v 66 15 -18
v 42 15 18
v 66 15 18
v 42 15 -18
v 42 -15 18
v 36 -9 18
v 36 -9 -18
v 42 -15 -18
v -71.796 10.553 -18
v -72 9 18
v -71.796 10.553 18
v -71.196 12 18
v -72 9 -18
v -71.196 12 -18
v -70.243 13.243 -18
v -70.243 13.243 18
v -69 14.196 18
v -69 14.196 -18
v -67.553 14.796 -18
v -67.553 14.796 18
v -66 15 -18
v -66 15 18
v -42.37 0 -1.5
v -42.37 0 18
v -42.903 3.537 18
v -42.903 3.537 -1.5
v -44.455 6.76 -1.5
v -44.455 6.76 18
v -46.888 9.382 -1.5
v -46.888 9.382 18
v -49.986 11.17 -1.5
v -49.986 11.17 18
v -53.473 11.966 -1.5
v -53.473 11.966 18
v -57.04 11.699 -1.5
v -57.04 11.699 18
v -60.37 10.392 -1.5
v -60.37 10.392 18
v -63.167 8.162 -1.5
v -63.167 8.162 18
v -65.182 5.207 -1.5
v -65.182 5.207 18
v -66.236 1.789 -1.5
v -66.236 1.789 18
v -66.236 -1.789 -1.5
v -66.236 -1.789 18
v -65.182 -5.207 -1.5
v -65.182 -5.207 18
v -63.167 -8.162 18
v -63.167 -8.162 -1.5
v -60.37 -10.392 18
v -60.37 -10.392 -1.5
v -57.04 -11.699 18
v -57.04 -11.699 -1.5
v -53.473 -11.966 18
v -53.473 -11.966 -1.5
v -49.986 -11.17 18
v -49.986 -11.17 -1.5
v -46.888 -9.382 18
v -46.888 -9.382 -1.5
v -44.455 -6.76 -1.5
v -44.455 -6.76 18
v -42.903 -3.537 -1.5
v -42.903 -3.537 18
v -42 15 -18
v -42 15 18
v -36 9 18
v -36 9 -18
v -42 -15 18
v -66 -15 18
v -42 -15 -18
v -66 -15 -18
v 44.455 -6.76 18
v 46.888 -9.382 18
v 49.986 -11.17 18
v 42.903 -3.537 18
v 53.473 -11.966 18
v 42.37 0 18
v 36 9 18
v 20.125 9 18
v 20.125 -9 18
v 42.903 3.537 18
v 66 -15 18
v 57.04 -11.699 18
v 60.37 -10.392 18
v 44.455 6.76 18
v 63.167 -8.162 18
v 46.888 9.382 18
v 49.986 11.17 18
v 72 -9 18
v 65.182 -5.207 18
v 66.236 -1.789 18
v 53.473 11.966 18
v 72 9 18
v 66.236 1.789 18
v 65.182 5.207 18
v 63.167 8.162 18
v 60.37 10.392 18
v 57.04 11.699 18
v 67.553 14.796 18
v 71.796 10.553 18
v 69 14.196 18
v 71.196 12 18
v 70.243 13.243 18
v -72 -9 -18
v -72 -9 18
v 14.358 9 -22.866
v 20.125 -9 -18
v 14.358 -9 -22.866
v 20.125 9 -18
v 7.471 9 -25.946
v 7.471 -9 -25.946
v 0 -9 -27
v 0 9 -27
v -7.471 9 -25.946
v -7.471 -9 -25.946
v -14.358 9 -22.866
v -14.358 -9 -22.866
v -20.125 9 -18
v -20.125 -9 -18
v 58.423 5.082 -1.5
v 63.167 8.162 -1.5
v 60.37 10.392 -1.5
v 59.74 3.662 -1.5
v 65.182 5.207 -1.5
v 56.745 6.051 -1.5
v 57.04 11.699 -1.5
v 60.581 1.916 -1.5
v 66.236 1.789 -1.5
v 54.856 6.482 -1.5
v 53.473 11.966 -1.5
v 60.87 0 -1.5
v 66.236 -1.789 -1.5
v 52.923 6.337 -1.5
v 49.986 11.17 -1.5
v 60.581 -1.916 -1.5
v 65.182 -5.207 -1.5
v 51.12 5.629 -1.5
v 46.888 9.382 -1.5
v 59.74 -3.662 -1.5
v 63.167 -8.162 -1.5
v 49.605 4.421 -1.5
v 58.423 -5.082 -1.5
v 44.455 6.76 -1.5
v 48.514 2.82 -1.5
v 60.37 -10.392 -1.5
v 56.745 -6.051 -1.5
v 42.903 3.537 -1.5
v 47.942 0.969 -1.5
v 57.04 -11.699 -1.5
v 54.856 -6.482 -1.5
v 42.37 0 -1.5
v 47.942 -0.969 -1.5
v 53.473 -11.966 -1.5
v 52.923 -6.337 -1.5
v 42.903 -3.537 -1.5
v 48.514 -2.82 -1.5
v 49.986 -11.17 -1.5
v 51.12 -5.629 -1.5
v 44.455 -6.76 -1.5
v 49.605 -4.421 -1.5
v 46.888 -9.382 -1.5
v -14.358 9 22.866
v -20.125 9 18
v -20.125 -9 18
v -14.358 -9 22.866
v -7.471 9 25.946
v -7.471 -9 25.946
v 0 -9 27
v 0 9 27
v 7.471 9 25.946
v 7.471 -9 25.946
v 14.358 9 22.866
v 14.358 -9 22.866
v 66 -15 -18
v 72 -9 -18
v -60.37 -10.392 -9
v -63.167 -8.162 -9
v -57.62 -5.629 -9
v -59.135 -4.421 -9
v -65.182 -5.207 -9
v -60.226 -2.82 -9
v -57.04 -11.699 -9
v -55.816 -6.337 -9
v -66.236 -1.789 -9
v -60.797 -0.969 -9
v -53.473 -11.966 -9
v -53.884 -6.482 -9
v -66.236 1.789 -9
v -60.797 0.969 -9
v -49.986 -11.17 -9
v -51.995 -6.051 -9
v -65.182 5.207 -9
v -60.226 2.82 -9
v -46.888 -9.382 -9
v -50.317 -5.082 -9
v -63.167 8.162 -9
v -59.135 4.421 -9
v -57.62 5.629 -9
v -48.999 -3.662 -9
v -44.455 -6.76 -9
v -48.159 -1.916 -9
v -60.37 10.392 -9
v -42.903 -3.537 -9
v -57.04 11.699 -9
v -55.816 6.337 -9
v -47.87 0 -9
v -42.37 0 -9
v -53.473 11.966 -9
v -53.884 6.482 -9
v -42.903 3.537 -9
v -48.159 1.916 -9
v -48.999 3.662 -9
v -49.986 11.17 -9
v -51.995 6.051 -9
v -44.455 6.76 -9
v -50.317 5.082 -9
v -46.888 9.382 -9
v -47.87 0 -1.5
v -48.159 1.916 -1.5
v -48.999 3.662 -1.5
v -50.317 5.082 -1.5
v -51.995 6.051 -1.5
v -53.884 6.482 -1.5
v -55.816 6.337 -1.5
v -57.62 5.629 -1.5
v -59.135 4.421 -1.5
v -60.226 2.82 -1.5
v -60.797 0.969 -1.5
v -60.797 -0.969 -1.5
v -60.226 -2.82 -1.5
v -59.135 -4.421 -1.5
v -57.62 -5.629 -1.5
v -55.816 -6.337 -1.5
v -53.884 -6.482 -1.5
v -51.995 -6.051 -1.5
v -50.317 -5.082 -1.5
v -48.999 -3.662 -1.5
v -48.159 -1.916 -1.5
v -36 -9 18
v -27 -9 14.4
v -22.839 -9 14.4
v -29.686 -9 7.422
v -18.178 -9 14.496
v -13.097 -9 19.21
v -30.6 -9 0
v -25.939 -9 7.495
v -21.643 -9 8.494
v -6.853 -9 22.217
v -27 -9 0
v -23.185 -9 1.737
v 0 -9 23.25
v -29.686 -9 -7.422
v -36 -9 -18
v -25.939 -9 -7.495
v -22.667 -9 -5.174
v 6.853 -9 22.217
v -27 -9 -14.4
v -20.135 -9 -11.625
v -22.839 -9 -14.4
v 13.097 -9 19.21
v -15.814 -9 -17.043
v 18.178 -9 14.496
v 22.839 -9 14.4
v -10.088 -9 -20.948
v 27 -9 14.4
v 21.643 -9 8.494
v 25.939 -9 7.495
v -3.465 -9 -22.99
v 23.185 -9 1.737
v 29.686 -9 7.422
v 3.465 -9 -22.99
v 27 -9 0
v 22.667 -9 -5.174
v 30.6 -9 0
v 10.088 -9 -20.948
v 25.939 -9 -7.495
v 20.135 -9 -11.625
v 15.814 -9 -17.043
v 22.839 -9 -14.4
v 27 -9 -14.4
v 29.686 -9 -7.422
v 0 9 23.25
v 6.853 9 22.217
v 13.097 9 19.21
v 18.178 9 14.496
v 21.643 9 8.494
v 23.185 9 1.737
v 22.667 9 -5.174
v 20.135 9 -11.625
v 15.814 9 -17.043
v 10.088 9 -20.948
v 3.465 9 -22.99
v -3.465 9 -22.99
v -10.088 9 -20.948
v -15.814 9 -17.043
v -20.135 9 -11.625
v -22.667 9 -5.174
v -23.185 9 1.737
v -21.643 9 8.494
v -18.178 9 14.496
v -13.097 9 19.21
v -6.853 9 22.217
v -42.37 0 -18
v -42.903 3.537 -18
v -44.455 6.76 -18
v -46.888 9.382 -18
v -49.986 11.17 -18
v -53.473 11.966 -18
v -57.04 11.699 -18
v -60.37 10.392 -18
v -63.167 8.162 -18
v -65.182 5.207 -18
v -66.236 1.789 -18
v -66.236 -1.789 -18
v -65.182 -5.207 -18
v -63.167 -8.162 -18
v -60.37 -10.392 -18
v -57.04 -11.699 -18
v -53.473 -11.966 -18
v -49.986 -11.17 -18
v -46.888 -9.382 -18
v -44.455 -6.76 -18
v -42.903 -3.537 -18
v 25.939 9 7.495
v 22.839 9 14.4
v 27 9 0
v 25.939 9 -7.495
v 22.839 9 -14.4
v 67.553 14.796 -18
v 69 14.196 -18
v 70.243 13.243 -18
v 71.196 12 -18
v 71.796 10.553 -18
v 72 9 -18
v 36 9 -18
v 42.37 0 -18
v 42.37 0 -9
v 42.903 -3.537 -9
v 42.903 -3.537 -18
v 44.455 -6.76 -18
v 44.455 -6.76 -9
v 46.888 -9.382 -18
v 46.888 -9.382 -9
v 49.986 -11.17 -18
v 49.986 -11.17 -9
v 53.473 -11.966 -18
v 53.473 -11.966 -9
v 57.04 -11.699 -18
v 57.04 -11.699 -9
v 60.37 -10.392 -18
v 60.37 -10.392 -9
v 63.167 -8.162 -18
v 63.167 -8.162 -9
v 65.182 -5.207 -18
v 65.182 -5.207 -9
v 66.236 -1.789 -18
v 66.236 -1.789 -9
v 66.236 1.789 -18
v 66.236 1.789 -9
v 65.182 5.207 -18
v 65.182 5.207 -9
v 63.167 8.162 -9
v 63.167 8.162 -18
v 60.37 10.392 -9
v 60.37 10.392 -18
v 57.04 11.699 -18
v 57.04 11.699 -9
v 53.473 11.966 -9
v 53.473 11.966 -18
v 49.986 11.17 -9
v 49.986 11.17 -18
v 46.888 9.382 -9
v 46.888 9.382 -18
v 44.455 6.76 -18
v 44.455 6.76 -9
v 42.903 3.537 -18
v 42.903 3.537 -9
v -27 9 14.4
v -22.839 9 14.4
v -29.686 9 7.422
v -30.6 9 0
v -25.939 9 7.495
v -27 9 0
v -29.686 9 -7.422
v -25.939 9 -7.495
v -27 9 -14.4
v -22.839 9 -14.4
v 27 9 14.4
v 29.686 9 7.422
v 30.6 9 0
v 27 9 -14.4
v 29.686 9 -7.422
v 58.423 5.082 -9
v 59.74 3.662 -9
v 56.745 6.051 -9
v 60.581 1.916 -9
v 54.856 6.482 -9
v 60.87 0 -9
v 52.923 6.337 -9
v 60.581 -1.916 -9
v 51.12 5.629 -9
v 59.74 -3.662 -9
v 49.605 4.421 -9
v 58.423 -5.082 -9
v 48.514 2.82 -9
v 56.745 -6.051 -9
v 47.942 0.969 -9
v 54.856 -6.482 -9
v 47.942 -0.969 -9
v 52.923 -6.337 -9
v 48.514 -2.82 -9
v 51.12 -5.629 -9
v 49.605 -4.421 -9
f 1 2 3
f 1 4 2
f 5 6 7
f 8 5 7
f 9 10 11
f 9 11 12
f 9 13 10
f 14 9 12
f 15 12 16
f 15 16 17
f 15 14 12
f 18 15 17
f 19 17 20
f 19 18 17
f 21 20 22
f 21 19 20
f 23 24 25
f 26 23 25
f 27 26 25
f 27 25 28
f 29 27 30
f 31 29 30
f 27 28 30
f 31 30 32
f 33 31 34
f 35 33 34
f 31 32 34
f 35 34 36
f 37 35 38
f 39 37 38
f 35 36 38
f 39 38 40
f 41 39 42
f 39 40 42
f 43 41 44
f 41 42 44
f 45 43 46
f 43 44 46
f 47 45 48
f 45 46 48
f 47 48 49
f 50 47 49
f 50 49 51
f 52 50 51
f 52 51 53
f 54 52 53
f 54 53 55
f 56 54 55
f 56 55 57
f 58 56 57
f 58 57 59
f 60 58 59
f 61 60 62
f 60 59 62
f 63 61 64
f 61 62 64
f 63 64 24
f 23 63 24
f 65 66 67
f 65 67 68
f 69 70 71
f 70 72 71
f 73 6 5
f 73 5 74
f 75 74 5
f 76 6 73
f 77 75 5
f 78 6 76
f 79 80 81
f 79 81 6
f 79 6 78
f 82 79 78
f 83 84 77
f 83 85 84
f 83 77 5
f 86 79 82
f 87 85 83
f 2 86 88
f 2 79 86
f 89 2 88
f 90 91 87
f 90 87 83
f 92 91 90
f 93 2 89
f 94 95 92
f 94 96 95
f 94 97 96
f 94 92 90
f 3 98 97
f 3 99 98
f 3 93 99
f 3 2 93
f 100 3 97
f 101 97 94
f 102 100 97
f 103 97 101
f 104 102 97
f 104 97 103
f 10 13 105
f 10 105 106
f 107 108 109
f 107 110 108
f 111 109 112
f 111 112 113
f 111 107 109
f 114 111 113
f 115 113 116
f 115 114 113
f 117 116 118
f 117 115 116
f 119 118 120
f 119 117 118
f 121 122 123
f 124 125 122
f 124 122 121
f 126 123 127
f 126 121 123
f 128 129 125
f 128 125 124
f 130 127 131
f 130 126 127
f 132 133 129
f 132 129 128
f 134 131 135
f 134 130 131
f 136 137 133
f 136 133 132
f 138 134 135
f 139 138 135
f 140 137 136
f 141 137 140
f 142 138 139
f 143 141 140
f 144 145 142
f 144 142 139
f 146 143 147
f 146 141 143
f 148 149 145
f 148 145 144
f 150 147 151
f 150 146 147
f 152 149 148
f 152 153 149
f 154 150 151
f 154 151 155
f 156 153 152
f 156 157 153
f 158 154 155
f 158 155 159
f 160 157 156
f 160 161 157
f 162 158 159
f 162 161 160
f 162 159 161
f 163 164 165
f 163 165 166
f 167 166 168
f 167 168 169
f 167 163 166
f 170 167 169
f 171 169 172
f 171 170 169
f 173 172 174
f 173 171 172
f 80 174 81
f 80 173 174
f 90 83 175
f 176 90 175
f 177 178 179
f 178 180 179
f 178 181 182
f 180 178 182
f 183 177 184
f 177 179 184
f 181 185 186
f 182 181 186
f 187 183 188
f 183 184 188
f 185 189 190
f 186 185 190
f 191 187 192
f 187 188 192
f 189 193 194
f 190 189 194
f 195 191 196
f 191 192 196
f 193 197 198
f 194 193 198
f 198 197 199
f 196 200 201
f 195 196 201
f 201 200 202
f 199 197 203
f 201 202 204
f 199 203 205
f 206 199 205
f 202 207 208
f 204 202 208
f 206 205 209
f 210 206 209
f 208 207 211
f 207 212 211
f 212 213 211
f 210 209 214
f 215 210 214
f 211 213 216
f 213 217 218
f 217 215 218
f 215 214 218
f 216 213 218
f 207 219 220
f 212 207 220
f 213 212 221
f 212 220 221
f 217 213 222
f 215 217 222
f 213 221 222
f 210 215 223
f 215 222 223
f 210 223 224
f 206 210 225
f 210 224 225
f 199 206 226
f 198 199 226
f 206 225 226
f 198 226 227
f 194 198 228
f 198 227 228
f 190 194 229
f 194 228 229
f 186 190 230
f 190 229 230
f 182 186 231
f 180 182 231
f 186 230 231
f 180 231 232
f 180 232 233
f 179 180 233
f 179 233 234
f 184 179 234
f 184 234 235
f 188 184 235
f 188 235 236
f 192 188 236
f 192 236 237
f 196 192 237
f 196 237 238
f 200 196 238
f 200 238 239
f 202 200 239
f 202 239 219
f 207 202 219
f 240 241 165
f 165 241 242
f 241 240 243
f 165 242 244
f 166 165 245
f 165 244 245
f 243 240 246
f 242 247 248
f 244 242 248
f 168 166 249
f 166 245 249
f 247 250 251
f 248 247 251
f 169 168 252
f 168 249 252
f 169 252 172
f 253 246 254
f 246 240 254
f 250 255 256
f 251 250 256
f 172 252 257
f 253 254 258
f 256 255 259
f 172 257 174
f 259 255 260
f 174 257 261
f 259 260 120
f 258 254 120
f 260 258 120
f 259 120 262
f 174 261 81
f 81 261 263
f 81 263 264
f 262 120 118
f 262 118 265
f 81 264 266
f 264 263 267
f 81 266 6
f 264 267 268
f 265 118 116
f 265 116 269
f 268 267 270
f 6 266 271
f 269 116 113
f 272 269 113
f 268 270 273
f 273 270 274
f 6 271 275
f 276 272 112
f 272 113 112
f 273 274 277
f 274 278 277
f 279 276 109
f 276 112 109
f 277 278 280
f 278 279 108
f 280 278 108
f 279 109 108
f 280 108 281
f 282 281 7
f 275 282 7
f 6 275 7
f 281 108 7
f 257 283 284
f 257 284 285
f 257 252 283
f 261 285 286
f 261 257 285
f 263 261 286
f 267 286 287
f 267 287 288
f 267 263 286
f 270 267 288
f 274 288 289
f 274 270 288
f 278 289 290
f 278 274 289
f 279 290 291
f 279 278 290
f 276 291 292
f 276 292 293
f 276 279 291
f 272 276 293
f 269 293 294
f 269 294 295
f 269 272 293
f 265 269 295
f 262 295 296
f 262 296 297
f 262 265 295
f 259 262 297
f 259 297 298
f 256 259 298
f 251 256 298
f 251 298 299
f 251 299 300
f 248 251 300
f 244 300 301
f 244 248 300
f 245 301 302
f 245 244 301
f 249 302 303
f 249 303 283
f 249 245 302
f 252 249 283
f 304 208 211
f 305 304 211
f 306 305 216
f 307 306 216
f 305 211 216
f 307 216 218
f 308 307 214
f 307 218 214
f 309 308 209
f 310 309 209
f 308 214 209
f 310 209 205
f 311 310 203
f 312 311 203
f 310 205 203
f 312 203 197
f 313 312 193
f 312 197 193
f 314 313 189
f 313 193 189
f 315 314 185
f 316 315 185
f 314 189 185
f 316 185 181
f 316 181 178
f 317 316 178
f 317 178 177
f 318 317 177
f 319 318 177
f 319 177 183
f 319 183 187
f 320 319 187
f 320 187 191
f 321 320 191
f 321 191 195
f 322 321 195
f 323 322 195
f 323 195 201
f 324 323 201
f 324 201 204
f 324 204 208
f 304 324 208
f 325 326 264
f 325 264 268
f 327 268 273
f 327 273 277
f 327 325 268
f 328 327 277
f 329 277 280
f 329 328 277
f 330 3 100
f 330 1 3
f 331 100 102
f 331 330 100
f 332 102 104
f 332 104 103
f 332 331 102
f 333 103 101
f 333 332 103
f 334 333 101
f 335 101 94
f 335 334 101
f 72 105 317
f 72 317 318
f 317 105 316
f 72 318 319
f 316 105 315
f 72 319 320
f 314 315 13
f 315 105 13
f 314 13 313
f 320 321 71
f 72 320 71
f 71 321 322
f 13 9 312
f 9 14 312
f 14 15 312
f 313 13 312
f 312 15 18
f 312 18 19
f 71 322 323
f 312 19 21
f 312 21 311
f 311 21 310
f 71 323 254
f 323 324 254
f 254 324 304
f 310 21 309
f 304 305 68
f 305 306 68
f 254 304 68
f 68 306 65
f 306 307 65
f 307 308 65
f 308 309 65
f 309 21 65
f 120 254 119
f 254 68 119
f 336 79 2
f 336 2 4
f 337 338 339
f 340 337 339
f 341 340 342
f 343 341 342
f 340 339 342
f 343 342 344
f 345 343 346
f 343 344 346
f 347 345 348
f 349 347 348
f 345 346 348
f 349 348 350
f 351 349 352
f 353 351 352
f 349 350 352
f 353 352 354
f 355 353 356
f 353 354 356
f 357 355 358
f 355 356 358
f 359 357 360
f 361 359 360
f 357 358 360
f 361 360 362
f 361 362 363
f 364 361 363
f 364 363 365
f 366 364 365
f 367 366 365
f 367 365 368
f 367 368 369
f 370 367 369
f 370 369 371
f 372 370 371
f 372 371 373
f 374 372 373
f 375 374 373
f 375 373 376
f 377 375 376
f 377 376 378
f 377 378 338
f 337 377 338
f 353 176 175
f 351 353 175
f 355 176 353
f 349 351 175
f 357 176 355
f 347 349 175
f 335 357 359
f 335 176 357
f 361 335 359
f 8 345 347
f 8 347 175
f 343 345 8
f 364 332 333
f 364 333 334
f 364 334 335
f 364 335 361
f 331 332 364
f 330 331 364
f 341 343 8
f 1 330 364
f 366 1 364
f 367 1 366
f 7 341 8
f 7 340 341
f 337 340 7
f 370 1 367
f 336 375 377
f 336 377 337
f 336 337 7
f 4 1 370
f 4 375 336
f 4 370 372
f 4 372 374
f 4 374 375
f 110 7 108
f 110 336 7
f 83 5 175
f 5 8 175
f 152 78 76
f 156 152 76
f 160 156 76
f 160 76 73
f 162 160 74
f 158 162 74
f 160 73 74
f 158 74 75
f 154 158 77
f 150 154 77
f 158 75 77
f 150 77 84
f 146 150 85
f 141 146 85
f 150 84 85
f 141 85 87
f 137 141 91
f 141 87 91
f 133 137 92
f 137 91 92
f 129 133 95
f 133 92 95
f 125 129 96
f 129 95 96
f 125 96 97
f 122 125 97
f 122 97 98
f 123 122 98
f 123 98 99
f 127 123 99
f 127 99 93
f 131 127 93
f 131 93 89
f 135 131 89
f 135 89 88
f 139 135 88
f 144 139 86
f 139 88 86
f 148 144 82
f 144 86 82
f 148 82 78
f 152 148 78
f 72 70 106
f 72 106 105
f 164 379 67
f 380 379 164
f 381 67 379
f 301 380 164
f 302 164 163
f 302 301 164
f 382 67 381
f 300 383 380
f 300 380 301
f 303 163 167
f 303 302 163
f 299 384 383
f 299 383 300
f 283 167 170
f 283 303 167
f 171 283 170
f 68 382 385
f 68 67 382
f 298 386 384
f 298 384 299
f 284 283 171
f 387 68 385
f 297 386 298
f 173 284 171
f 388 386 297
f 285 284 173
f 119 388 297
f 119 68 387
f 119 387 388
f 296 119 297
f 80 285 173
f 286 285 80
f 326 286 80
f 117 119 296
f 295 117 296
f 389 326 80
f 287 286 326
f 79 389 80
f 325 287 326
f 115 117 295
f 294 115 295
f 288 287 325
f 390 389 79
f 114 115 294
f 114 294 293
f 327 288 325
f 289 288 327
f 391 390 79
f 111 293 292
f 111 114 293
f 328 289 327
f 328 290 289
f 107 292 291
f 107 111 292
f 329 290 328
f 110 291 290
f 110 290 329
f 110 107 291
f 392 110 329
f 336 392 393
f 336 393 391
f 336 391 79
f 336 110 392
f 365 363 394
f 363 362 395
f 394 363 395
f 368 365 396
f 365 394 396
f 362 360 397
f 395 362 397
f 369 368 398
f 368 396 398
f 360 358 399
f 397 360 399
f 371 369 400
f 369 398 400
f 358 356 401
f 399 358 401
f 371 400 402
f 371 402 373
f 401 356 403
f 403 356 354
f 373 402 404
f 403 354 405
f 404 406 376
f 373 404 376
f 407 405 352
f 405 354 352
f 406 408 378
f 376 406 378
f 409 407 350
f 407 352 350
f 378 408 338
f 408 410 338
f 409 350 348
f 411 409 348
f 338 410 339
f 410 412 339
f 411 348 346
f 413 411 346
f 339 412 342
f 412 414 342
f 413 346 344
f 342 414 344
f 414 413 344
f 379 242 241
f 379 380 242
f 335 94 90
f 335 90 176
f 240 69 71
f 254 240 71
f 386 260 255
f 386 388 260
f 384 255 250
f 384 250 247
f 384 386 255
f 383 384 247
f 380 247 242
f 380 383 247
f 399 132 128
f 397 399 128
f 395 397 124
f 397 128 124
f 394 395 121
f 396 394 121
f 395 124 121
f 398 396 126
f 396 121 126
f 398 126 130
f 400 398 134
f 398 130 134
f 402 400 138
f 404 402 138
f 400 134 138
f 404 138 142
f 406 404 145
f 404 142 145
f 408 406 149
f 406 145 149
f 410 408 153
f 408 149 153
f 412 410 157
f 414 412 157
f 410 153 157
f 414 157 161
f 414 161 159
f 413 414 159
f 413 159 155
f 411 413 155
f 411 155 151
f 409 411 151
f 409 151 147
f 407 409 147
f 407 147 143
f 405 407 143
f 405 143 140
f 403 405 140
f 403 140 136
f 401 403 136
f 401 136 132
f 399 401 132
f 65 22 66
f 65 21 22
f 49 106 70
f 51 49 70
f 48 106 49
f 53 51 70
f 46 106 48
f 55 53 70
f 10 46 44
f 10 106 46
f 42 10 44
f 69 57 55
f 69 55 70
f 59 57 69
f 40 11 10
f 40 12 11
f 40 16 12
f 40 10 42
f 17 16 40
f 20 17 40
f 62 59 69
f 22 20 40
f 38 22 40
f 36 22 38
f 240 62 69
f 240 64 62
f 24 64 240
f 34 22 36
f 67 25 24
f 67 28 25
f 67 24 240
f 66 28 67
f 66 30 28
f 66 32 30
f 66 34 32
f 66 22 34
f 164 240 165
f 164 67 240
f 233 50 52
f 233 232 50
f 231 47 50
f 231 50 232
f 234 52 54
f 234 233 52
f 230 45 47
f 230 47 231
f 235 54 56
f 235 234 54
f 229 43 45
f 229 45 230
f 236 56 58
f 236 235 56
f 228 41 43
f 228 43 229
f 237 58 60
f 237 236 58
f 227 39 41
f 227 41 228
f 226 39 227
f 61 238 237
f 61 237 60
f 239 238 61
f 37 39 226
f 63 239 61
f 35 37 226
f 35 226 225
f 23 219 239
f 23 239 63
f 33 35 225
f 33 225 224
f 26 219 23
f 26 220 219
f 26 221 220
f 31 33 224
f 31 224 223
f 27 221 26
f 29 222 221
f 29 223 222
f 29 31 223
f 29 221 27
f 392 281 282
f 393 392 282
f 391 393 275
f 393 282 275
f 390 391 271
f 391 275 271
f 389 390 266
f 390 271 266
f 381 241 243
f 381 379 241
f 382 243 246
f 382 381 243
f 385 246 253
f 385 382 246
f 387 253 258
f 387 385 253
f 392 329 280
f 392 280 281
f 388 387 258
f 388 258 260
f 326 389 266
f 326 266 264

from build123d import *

# Parameters (mm, degrees)
SKETCH1_W             = 36
SKETCH1_H             = 36
BOSS_EXTRUDE3_DEPTH   = 15
BOSS_EXTRUDE3_2_DEPTH = 15
SKETCH1_6_R           = 23.25
BOSS_EXTRUDE4_DEPTH   = 9
CHAMFER3_SIZE         = 6
FILLET1_R             = 6
SKETCH2_R             = 6.5
CUT_EXTRUDE2_DEPTH    = 64.5
SKETCH2_4_R           = 12
SKETCH2_4_R_2         = 6.5
CUT_EXTRUDE3_DEPTH    = 19.5
CUT_EXTRUDE5_START    = -7.5
SKETCH4_R             = 12
SKETCH4_R_2           = 6.5
CUT_EXTRUDE5_DEPTH    = 87


with BuildPart() as part:
    # Sketch1 → Boss-Extrude3 (new, symmetric)
    with BuildSketch(Plane(origin=(0, 0, 0), x_dir=(1, 0, 0), z_dir=(0, 1, 0))):
        with Locations((-54, 0)):
            Rectangle(SKETCH1_W, SKETCH1_H)
    extrude(amount=BOSS_EXTRUDE3_DEPTH, both=True)



with BuildPart() as body_2:
    # Sketch1 → Boss-Extrude3 2 (new, symmetric)
    with BuildSketch(Plane(origin=(0, 0, 0), x_dir=(1, 0, 0), z_dir=(0, 1, 0))):
        with Locations((54, 0)):
            Rectangle(SKETCH1_W, SKETCH1_H)
    extrude(amount=BOSS_EXTRUDE3_2_DEPTH, both=True)


with BuildPart() as part_1:
    add(part.part)

    add(body_2.part)  # Boss-Extrude4 merges body 2
    # Sketch1<6> → Boss-Extrude4 (add, symmetric)
    with BuildSketch(Plane(origin=(0, 0, 0), x_dir=(1, 0, 0), z_dir=(0, 1, 0))):
        with BuildLine():
            Line((-72, -18), (-20.124611797, -18))
            ThreePointArc((-20.124611797, -18), (0, -27), (20.124611797, -18))
            Line((20.124611797, -18), (72, -18))
            Line((72, -18), (72, 18))
            Line((72, 18), (20.124611797, 18))
            ThreePointArc((20.124611797, 18), (0, 27), (-20.124611797, 18))
            Line((-20.124611797, 18), (-72, 18))
            Line((-72, 18), (-72, -18))
        make_face()
        with Locations(Location((0, 0, 0), (0, 0, 270))):
            Circle(SKETCH1_6_R, mode=Mode.SUBTRACT)
        with BuildLine():
            Line((22.839439573, 14.4), (27, 14.4))
            ThreePointArc((27, 14.4), (30.6, 0), (27, -14.4))
            Line((27, -14.4), (22.839439573, -14.4))
            ThreePointArc((22.839439573, -14.4), (27, 0), (22.839439573, 14.4))
        make_face(mode=Mode.SUBTRACT)
        with BuildLine():
            Line((-27, 14.4), (-22.839439573, 14.4))
            ThreePointArc((-22.839439573, 14.4), (-27, 0), (-22.839439573, -14.4))
            Line((-22.839439573, -14.4), (-27, -14.4))
            ThreePointArc((-27, -14.4), (-30.6, 0), (-27, 14.4))
        make_face(mode=Mode.SUBTRACT)
    extrude(amount=BOSS_EXTRUDE4_DEPTH, both=True)

    # Chamfer3
    chamfer3_edges = [part_1.edges().sort_by_distance(p)[0] for p in [
        (36, 15, 0),
        (72, -15, 0),
        (36, -15, 0),
        (-36, -15, 0),
        (-72, -15, 0),
        (-36, 15, 0),
    ]]
    chamfer(chamfer3_edges, length=CHAMFER3_SIZE - 0.0001)  # a hair under: the kernel refuses the full size

    # Fillet1
    fillet1_edges = [part_1.edges().sort_by_distance(p)[0] for p in [
        (-72, 15, 0),
        (72, 15, 0),
    ]]
    fillet(fillet1_edges, radius=FILLET1_R)

    # Sketch2 → Cut-Extrude2 (cut)
    with BuildSketch(Plane.XY.offset(18)):
        with Locations((-54.369879574, 0)):
            Circle(SKETCH2_R)
        with Locations((54.369879574, 0)):
            Circle(SKETCH2_R)
    extrude(amount=-CUT_EXTRUDE2_DEPTH, mode=Mode.SUBTRACT)

    # Sketch2<4> → Cut-Extrude3 (cut)
    # profile 1 of 2: a face of its own
    with BuildSketch(Plane.XY.offset(18)):
        with Locations((-54.369879574, 0)):
            Circle(SKETCH2_4_R)
        with Locations((-54.369879574, 0)):
            Circle(SKETCH2_4_R_2, mode=Mode.SUBTRACT)
    # profile 2 of 2: a face of its own
    with BuildSketch(Plane.XY.offset(18)):
        with Locations(Location((54.369879574, 0, 0), (0, 0, 180))):
            Circle(SKETCH2_4_R)
        with Locations((54.369879574, 0)):
            Circle(SKETCH2_4_R_2, mode=Mode.SUBTRACT)
    extrude(amount=-CUT_EXTRUDE3_DEPTH, mode=Mode.SUBTRACT)

    # Sketch4 → Cut-Extrude5 (cut)
    # profile 1 of 2: a face of its own
    with BuildSketch(Plane.XY.offset(-1.5).offset(CUT_EXTRUDE5_START)):
        with Locations(Location((54.369879574, 0, 0), (0, 0, 180))):
            Circle(SKETCH4_R)
        with Locations((54.369879574, 0)):
            Circle(SKETCH4_R_2, mode=Mode.SUBTRACT)
    # profile 2 of 2: a face of its own
    with BuildSketch(Plane.XY.offset(-1.5).offset(CUT_EXTRUDE5_START)):
        with Locations((-54.369879574, 0)):
            Circle(SKETCH4_R)
        with Locations((-54.369879574, 0)):
            Circle(SKETCH4_R_2, mode=Mode.SUBTRACT)
    extrude(amount=-CUT_EXTRUDE5_DEPTH, mode=Mode.SUBTRACT)


solid = part_1.part
